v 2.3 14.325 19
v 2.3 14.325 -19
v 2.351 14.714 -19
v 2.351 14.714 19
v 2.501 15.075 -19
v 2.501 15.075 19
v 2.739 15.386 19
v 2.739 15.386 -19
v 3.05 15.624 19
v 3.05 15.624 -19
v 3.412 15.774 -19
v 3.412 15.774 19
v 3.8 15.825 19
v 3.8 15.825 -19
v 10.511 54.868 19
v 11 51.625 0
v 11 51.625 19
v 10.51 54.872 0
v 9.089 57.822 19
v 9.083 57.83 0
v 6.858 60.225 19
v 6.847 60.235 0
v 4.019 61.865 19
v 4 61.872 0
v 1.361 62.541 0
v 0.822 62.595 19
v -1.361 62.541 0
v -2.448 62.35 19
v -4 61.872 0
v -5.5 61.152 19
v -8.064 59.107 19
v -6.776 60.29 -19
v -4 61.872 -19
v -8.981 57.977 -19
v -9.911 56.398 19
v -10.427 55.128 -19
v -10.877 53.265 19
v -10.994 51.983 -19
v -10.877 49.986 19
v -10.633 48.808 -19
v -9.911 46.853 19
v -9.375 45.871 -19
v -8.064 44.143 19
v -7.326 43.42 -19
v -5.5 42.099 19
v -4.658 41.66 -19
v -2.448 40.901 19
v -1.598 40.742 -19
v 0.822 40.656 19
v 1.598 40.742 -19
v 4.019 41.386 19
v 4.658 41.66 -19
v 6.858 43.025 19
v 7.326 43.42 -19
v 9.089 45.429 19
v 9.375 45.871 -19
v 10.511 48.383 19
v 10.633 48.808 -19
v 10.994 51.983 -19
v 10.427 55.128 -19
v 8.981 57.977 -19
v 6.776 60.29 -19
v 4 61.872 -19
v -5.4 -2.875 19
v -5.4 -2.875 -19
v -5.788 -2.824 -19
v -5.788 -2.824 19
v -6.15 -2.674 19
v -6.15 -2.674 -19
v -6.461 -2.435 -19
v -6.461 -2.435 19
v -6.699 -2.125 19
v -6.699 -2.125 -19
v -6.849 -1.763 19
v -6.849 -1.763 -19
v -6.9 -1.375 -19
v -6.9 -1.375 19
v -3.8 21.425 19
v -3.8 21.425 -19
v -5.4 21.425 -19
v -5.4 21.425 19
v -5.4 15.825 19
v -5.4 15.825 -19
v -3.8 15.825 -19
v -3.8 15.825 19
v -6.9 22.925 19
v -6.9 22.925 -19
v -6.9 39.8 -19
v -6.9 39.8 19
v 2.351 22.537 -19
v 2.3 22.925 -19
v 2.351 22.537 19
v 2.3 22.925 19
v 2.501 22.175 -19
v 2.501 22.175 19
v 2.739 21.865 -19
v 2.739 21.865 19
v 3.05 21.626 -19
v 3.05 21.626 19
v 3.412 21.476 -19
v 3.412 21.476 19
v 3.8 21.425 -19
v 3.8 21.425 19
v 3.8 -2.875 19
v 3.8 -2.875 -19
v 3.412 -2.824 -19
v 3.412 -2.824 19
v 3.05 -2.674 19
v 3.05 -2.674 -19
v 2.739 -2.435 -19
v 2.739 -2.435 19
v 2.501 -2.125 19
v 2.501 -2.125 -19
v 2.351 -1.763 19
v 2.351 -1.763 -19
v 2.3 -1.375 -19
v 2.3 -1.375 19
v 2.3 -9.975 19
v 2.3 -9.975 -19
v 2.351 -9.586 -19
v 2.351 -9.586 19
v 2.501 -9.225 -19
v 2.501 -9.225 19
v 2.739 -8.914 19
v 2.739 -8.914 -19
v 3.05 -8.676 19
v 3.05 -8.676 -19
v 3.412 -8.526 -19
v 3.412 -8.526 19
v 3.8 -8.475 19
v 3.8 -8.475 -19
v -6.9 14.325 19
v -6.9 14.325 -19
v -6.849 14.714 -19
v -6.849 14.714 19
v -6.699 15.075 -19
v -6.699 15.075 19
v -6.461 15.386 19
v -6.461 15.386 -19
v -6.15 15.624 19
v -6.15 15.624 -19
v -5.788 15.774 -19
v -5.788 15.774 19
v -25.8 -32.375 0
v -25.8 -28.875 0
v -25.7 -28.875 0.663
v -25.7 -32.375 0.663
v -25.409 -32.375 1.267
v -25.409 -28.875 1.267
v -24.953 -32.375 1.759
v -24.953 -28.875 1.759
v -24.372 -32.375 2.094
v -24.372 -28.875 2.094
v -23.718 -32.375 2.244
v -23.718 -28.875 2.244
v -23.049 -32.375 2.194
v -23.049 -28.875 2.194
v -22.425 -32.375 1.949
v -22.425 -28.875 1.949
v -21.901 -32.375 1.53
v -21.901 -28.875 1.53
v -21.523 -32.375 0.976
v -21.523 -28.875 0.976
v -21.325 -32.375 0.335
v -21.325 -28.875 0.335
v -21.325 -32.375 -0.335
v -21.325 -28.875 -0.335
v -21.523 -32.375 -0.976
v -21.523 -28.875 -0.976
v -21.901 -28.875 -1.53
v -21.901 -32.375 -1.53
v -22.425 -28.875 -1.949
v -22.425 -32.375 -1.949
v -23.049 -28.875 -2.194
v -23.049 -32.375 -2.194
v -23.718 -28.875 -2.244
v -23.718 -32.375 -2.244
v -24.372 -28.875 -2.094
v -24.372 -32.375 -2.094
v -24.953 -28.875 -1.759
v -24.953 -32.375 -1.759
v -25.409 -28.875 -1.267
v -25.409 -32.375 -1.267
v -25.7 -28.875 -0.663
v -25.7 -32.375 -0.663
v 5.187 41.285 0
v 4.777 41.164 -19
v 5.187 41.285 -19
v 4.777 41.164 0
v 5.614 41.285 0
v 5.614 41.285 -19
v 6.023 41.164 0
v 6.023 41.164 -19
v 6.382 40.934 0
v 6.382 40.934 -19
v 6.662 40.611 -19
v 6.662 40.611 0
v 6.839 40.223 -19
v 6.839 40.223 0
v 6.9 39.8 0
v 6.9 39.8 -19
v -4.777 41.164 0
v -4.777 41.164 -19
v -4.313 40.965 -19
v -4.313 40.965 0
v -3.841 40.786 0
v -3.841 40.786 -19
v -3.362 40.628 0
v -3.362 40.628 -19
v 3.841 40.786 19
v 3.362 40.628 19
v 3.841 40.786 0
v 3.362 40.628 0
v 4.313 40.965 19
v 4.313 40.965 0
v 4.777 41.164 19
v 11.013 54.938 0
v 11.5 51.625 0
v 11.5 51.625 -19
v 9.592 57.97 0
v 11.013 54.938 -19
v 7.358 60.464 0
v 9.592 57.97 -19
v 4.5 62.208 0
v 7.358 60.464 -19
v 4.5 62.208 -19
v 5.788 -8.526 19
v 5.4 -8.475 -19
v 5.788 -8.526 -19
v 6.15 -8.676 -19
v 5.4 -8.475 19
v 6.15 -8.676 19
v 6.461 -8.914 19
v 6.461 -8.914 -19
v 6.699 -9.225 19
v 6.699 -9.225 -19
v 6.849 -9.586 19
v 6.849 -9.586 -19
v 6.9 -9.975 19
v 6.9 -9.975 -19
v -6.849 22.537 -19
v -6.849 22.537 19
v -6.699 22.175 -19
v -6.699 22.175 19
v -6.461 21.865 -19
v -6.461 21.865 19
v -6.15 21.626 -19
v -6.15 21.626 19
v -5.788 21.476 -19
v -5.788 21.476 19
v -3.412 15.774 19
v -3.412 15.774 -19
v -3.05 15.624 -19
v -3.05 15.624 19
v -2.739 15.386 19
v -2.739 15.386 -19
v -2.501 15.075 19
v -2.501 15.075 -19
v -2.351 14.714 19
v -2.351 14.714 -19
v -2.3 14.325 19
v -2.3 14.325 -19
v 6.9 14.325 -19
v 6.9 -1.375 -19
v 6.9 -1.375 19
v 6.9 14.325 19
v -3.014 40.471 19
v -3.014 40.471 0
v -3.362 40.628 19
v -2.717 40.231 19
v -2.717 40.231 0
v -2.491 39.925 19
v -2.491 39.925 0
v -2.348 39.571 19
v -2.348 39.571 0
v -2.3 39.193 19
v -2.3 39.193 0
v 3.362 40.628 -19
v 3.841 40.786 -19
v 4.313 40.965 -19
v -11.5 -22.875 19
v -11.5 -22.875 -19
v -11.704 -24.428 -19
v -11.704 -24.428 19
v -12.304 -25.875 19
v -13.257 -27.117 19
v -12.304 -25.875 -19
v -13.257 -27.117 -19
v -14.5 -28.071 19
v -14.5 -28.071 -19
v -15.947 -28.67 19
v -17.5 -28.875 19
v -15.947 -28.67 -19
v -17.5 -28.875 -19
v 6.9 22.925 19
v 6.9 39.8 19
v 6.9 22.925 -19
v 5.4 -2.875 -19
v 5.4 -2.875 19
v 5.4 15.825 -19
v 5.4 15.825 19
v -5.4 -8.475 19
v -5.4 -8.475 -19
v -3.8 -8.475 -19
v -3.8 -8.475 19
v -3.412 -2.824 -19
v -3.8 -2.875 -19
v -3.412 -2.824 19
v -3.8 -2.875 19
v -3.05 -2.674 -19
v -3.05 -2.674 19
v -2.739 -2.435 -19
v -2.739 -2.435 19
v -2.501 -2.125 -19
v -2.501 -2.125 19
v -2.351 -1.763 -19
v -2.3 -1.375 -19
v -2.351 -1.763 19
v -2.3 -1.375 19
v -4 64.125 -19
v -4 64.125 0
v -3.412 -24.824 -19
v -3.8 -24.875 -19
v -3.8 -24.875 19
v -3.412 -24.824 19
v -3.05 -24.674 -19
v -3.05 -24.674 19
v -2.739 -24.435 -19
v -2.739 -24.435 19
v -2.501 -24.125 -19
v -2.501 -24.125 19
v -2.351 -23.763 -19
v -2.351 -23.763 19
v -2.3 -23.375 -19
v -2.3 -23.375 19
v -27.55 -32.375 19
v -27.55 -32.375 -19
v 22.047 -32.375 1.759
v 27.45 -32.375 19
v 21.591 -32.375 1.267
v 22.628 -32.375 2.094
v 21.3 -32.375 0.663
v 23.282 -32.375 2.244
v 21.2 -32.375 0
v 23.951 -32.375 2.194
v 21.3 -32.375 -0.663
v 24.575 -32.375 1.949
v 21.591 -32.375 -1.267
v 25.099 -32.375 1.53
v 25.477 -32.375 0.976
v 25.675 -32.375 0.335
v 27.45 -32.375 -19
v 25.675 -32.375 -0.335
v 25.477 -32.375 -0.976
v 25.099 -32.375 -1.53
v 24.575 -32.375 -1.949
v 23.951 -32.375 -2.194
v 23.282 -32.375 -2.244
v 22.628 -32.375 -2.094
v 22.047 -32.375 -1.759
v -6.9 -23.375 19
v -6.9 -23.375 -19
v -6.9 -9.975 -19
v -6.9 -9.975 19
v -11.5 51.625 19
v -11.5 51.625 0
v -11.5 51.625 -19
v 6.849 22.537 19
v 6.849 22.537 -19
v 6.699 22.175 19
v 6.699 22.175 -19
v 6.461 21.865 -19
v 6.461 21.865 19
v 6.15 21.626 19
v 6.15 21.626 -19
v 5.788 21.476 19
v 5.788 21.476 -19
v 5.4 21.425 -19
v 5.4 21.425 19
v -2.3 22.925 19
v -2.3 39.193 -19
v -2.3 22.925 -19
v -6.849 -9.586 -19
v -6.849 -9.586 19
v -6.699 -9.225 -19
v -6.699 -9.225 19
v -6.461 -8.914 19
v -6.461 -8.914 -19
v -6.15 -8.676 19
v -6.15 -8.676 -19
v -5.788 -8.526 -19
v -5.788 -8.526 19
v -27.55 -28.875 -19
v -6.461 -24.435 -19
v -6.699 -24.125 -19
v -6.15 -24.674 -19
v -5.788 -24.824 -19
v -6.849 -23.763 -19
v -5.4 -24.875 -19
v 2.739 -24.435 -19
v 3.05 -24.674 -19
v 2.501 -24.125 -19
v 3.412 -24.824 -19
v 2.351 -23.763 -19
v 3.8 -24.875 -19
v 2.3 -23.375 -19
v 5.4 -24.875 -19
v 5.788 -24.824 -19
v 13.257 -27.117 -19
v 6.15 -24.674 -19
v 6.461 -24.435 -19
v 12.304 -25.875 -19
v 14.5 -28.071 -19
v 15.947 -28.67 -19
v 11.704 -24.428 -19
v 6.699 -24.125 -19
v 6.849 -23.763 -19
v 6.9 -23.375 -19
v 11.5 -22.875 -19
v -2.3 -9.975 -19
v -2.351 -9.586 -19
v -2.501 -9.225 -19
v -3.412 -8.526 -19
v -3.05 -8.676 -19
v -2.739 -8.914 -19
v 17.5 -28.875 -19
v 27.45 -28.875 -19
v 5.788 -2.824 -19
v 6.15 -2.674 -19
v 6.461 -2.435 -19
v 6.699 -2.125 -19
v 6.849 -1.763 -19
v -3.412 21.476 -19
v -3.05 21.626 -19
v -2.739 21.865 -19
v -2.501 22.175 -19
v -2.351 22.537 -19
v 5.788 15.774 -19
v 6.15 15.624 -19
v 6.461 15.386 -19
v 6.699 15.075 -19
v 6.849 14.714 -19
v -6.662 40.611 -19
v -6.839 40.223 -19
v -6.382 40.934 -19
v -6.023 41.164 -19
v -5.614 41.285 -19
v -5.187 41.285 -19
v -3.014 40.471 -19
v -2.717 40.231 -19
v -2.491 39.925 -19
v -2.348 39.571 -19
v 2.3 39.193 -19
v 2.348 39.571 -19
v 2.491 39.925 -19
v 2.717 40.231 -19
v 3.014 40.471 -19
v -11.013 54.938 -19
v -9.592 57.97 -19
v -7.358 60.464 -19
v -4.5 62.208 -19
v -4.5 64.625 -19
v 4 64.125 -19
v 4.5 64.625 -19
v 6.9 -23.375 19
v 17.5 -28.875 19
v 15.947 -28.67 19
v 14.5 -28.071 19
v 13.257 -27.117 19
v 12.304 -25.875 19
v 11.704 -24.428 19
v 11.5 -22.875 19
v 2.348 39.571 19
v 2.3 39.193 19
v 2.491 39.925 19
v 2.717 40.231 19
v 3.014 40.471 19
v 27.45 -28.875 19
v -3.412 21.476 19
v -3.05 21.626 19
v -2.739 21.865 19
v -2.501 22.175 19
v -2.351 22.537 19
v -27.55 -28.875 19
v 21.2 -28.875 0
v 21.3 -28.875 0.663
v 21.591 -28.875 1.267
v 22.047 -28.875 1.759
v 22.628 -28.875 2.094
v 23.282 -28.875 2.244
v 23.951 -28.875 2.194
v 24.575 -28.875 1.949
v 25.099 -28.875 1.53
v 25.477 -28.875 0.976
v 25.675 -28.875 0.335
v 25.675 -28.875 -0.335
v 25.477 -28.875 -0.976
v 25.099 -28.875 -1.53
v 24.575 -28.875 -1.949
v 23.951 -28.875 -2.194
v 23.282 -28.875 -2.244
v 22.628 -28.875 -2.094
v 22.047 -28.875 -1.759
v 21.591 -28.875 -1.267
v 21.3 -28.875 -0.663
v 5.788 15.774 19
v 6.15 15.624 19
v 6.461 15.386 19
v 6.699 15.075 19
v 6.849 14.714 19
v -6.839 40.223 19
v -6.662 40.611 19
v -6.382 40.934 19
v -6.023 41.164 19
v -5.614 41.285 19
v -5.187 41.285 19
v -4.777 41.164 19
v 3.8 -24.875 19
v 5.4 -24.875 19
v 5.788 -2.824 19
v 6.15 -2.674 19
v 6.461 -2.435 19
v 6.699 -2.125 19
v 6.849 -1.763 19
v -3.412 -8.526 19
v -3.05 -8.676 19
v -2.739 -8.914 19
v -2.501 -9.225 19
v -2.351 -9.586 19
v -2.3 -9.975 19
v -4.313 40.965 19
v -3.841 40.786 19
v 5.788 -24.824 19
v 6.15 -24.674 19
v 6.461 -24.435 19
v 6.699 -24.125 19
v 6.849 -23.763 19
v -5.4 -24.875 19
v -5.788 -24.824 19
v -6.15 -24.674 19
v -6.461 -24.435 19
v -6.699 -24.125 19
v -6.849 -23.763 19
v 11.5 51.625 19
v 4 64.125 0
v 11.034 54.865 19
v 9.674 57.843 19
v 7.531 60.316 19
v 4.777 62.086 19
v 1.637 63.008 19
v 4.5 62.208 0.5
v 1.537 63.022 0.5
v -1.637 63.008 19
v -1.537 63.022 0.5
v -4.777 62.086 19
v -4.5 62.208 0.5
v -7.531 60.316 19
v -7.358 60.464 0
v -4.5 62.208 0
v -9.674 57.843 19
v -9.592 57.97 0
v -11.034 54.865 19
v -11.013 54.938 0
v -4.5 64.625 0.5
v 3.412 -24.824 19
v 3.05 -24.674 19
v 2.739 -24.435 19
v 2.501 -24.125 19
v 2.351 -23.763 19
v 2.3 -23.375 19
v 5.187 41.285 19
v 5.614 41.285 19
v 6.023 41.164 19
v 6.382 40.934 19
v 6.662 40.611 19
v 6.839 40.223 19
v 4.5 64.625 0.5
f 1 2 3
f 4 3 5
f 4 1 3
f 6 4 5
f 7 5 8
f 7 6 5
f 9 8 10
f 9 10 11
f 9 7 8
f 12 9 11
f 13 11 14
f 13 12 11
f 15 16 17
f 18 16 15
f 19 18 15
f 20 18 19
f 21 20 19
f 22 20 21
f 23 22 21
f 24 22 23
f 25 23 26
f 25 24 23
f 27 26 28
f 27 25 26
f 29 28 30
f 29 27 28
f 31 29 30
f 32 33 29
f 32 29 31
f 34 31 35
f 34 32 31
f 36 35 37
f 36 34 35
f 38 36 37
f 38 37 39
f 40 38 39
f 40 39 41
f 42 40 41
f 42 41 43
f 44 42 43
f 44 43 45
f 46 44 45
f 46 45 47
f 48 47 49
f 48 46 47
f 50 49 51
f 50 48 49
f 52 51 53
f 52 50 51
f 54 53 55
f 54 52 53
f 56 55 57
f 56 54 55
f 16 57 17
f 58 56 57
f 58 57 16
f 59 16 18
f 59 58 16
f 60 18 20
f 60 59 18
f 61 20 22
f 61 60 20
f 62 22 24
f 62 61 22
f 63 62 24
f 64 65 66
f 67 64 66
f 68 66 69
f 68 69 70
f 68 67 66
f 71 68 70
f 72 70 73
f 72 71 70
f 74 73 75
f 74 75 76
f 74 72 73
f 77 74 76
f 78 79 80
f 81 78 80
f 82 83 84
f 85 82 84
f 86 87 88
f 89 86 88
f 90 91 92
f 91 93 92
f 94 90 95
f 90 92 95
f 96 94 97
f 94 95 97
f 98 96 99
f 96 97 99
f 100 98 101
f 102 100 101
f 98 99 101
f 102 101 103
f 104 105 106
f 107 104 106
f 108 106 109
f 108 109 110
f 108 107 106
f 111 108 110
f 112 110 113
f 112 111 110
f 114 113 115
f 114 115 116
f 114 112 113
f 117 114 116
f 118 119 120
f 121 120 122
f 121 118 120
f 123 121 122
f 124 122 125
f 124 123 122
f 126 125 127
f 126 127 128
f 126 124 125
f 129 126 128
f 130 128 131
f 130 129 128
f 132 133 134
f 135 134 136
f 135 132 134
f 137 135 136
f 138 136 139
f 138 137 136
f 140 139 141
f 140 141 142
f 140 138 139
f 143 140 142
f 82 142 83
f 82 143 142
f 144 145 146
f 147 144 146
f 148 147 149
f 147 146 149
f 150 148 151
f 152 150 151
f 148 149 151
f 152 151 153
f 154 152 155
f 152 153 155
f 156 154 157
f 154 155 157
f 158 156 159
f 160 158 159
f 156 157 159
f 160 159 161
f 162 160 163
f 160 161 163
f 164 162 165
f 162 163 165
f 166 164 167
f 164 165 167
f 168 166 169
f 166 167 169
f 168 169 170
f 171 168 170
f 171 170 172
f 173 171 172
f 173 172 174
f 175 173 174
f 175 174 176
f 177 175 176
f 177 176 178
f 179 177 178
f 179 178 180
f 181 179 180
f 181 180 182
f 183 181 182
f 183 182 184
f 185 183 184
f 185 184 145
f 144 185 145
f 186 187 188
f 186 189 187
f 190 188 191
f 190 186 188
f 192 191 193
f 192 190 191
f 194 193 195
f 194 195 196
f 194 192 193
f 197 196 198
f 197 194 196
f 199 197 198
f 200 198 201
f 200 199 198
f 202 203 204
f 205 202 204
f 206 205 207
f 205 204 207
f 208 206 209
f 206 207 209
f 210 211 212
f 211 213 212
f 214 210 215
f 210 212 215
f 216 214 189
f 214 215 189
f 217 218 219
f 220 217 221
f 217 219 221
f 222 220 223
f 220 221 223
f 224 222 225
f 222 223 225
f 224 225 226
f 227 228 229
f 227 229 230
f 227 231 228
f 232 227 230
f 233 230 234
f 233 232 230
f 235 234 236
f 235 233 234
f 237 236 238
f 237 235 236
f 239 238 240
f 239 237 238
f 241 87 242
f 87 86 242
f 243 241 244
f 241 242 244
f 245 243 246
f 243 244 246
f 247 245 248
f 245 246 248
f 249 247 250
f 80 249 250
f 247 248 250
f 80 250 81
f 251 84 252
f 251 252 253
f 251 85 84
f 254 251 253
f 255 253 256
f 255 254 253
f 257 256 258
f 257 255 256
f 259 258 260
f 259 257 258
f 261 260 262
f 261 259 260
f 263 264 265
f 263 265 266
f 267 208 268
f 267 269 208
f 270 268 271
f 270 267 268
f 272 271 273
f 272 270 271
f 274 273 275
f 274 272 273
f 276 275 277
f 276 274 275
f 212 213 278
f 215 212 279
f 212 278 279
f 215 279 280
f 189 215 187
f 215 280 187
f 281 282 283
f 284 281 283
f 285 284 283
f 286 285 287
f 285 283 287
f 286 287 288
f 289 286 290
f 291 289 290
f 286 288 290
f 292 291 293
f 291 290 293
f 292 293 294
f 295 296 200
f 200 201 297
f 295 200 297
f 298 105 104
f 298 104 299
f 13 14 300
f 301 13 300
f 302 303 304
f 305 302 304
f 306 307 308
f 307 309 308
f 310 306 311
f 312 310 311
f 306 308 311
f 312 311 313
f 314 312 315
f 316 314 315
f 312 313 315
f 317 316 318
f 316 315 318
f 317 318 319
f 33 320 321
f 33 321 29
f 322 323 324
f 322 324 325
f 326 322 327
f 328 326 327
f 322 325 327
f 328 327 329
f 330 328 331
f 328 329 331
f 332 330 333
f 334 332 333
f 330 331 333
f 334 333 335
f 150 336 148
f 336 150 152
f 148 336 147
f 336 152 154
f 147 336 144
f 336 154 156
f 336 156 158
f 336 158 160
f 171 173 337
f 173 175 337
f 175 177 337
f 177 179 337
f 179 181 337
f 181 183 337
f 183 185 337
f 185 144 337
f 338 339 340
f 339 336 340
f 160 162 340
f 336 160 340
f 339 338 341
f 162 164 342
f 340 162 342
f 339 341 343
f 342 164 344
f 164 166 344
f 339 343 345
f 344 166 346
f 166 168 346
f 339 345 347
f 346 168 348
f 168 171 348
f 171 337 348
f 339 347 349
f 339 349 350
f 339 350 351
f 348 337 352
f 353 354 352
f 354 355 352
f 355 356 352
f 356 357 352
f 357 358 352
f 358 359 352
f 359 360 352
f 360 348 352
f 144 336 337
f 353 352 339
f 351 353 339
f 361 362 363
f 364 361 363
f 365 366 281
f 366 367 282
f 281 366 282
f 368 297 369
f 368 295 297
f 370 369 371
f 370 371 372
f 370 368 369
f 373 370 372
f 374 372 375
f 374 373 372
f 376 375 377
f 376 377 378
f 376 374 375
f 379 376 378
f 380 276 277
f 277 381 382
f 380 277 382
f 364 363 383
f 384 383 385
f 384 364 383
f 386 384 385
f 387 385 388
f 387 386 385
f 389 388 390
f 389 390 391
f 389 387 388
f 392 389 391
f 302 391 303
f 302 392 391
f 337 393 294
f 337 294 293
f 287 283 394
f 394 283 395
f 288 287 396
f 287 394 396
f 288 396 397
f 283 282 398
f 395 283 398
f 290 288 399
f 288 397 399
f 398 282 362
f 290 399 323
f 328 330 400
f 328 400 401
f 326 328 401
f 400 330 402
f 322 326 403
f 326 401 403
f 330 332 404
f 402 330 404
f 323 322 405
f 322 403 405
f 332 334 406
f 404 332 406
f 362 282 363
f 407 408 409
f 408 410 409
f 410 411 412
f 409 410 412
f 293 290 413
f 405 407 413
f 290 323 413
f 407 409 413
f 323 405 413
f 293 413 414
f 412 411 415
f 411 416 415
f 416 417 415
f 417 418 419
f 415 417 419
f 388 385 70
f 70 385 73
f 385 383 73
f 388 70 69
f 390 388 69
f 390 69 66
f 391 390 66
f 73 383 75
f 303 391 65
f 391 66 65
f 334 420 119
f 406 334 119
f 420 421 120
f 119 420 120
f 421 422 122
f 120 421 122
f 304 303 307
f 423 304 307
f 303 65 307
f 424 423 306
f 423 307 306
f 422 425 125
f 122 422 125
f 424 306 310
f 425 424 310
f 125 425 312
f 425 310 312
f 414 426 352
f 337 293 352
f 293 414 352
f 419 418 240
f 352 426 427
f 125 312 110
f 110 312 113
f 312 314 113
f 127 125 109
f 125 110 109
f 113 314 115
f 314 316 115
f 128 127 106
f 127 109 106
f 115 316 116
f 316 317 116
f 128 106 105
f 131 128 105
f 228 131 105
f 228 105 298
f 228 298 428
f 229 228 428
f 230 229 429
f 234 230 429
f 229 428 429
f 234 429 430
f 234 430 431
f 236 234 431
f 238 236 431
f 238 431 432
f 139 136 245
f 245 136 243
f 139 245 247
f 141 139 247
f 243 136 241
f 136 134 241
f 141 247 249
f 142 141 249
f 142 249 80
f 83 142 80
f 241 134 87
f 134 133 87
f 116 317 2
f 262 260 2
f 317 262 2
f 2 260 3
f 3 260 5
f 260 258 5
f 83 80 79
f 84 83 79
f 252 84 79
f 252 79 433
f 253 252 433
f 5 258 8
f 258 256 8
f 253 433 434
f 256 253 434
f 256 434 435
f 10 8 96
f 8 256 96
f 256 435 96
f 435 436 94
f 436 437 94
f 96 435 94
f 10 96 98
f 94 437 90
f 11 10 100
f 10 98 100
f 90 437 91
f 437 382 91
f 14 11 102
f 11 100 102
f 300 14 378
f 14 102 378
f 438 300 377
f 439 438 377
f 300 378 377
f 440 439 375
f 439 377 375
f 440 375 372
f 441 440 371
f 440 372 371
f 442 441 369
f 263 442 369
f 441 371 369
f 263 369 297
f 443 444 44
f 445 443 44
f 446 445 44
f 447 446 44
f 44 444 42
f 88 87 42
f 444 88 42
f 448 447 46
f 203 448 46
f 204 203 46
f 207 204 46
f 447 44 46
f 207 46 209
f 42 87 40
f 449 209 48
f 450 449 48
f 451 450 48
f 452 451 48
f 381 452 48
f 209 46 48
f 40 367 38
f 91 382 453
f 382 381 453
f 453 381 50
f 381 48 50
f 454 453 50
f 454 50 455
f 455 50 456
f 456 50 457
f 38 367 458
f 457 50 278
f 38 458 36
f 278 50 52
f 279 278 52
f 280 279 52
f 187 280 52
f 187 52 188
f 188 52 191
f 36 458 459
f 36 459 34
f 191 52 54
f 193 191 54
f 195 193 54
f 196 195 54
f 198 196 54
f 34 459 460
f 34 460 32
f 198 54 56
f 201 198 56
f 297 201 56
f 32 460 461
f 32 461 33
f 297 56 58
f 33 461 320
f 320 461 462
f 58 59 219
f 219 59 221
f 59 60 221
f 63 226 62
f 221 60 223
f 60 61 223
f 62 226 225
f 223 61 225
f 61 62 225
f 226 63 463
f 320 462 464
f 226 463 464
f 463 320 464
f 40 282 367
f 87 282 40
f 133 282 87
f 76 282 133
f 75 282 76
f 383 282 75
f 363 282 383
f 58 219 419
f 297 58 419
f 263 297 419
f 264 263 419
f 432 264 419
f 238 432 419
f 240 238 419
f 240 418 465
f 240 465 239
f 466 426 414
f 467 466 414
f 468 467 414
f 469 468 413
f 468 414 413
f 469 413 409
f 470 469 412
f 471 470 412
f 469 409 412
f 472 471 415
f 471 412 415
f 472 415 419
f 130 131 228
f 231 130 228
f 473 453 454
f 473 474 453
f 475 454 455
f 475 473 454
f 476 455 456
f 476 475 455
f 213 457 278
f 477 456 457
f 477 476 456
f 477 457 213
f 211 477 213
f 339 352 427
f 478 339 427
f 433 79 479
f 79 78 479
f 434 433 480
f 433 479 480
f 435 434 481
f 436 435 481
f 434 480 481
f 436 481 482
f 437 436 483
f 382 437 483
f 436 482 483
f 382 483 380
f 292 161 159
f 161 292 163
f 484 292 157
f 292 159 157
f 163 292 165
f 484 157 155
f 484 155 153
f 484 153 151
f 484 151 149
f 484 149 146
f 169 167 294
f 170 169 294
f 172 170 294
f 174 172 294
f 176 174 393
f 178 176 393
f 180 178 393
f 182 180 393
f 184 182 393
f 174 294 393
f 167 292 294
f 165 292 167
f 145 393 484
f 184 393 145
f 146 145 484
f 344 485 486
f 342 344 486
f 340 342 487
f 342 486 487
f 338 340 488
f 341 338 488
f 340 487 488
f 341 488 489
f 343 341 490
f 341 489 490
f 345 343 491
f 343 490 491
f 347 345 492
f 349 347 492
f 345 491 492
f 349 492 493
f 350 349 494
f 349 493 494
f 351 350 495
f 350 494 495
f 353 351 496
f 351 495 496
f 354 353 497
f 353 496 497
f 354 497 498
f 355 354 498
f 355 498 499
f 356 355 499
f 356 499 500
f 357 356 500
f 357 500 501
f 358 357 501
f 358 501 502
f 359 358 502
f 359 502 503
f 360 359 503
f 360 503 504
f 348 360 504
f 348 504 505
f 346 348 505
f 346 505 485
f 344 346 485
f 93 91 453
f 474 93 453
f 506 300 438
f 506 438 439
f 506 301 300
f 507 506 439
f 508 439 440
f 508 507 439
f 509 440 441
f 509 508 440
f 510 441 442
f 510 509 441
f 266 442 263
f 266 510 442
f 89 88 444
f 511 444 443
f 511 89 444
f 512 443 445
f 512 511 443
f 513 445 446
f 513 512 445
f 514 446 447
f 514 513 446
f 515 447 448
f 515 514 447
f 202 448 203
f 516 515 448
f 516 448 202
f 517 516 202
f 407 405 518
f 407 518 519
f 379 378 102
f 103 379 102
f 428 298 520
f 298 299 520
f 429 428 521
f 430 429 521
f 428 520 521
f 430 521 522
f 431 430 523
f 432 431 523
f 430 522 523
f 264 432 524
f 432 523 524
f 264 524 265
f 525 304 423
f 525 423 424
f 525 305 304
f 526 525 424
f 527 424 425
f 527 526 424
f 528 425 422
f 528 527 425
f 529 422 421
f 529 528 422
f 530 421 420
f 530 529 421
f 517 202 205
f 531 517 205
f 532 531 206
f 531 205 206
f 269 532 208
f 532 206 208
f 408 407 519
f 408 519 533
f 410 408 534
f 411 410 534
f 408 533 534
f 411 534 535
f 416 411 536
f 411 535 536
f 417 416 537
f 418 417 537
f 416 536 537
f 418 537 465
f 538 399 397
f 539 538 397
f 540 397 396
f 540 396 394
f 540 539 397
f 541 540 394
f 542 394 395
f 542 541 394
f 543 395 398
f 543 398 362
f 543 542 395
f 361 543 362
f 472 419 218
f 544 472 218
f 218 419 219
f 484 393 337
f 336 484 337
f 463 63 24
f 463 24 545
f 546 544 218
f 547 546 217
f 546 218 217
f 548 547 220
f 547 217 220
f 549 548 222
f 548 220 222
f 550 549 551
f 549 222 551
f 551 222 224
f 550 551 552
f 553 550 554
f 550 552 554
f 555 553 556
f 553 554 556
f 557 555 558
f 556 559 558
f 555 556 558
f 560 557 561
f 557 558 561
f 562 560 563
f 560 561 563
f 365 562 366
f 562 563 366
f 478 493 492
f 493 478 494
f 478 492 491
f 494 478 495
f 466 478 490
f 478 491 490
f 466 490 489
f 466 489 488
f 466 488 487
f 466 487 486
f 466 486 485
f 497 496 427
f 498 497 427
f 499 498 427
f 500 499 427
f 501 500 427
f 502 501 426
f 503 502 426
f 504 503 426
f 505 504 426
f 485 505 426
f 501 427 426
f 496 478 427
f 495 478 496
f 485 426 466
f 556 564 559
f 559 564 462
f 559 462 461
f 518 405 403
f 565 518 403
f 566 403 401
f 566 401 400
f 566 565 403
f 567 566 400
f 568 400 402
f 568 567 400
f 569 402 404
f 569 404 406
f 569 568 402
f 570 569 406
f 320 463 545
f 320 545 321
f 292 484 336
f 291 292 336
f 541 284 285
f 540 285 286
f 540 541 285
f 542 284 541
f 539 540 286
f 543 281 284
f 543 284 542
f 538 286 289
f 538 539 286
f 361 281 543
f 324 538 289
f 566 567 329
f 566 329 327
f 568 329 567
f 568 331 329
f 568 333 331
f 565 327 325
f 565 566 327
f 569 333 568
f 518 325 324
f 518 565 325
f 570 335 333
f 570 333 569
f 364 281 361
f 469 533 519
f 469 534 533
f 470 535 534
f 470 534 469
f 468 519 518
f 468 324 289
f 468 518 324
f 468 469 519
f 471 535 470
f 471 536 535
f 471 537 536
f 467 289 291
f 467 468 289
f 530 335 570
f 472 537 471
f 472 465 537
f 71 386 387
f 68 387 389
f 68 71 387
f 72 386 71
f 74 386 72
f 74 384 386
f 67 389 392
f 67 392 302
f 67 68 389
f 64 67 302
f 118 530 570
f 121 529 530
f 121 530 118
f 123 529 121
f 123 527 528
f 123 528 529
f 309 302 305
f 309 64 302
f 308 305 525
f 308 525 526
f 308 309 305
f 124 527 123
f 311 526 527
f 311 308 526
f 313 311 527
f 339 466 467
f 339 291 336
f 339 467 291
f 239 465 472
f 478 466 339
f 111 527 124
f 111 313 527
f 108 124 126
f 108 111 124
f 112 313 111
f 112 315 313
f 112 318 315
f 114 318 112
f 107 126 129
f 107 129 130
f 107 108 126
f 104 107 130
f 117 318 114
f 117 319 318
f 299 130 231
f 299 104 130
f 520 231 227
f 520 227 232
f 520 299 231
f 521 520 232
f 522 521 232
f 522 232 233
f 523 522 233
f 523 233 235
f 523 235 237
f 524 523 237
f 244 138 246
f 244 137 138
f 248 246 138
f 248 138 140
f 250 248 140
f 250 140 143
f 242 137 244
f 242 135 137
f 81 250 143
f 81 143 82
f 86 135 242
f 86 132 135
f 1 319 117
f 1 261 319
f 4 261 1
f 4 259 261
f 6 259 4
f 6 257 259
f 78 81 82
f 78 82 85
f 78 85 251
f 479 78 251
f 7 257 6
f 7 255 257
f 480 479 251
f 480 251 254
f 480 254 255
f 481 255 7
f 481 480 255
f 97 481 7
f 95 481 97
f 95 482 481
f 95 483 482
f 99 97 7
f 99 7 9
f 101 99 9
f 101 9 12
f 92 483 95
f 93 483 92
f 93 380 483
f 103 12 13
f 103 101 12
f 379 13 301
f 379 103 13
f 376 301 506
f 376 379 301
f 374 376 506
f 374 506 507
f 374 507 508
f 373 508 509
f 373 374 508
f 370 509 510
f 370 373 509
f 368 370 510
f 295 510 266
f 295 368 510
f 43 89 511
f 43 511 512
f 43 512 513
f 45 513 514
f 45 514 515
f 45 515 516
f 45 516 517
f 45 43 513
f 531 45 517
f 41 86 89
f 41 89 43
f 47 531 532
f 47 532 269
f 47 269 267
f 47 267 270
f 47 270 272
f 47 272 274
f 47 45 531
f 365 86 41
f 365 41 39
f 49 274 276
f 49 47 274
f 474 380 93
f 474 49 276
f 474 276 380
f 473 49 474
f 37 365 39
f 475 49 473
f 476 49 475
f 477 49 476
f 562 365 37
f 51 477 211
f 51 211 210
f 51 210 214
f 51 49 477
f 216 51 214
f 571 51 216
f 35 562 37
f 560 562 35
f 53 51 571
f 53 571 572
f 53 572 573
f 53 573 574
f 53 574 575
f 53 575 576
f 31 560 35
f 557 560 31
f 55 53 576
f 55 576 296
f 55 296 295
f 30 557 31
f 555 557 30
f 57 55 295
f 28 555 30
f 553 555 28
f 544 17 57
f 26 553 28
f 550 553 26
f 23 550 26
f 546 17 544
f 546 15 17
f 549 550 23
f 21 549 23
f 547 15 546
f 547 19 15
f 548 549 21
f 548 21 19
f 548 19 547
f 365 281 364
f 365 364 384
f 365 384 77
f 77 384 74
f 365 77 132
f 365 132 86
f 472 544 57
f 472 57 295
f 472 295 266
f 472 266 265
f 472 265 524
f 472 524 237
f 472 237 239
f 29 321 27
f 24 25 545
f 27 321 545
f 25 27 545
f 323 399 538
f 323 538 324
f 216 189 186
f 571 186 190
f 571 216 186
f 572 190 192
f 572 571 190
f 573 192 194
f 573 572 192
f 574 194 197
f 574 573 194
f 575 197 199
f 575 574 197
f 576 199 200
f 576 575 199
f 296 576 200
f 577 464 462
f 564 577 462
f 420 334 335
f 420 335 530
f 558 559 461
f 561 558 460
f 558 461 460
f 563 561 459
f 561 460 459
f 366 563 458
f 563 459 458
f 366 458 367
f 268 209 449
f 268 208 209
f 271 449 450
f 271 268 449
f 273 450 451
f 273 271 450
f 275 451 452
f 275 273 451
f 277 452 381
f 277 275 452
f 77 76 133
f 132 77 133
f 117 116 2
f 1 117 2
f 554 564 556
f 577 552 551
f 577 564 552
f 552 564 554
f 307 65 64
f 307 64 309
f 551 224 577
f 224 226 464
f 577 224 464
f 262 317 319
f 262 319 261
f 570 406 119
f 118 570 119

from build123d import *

# Parameters (mm, degrees)
CROQUIS1_R              = 11.5
CROQUIS1_R_2            = 11
SALIENTE_EXTRUIR1_DEPTH = 19
SALIENTE_EXTRUIR2_DEPTH = 0.5
SALIENTE_EXTRUIR3_START = 19
SALIENTE_EXTRUIR3_DEPTH = 19
SALIENTE_EXTRUIR4_START = -38
CROQUIS4_W              = 4.6
CROQUIS4_H              = 16.4
CROQUIS4_H_2            = 18.7
SALIENTE_EXTRUIR4_DEPTH = 38
CROQUIS5_R              = 2.25
CORTAR_EXTRUIR1_DEPTH   = 38
REDONDEO1_R             = 1.5


with BuildPart() as part:
    # Croquis1 → Saliente-Extruir1 (new body)
    with BuildSketch(Plane.XY):
        with Locations((0, 51.625329815)):
            Circle(CROQUIS1_R)
        with Locations((0, 51.625329815)):
            Circle(CROQUIS1_R_2, mode=Mode.SUBTRACT)
    extrude(amount=SALIENTE_EXTRUIR1_DEPTH)

    # Croquis3 → Saliente-Extruir2 (add)
    with BuildSketch(Plane(origin=(0, 0, 0), x_dir=(-1, 0, 0), z_dir=(0, 0, -1))):
        with BuildLine():
            Line((-4.5, 64.625329815), (4.5, 64.625329815))
            Line((4.5, 64.625329815), (4.5, 62.20833506))
            ThreePointArc((4.5, 62.20833506), (0, 63.125329815), (-4.5, 62.20833506))
            Line((-4.5, 62.20833506), (-4.5, 64.625329815))
        make_face()
    extrude(amount=-SALIENTE_EXTRUIR2_DEPTH)

    # Croquis2 → Saliente-Extruir3 (add)
    with BuildSketch(Plane(origin=(0, 0, 0), x_dir=(-1, 0, 0), z_dir=(0, 0, -1)).offset(SALIENTE_EXTRUIR3_START)):
        with BuildLine():
            Line((-4.5, 64.625329815), (4.5, 64.625329815))
            Line((4.5, 64.625329815), (4.5, 62.20833506))
            ThreePointArc((4.5, 62.20833506), (0, 40.125329815), (-4.5, 62.20833506))
            Line((-4.5, 62.20833506), (-4.5, 64.625329815))
        make_face()
        with BuildLine():
            Line((-4, 64.125329815), (4, 64.125329815))
            Line((4, 64.125329815), (4, 61.872280581))
            ThreePointArc((4, 61.872280581), (0, 40.625329815), (-4, 61.872280581))
            Line((-4, 61.872280581), (-4, 64.125329815))
        make_face(mode=Mode.SUBTRACT)
    extrude(amount=-SALIENTE_EXTRUIR3_DEPTH)

    # Croquis4 → Saliente-Extruir4 (add)
    with BuildSketch(Plane.XY.offset(19).offset(SALIENTE_EXTRUIR4_START)):
        with BuildLine():
            ThreePointArc((-6.9, 42.425329815), (-10.285912696, 46.482373467), (-11.5, 51.625329815))
            Line((-11.5, 51.625329815), (-11.5, -22.874670185))
            ThreePointArc((-11.5, -22.874670185), (-13.257359313, -27.117310872), (-17.5, -28.874670185))
            Line((-17.5, -28.874670185), (-27.55, -28.874670185))
            Line((-27.55, -28.874670185), (-27.55, -32.374670185))
            Line((-27.55, -32.374670185), (-11.55, -32.374670185))
            Line((-11.55, -32.374670185), (11.45, -32.374670185))
            Line((11.45, -32.374670185), (27.45, -32.374670185))
            Line((27.45, -32.374670185), (27.45, -28.874670185))
            Line((27.45, -28.874670185), (17.5, -28.874670185))
            ThreePointArc((17.5, -28.874670185), (13.257359313, -27.117310872), (11.5, -22.874670185))
            Line((11.5, -22.874670185), (11.5, 51.625329815))
            ThreePointArc((11.5, 51.625329815), (10.285912696, 46.482373467), (6.9, 42.425329815))
            Line((6.9, 42.425329815), (6.9, 21.425329815))
            Line((6.9, 21.425329815), (2.3, 21.425329815))
            Line((2.3, 21.425329815), (2.3, 40.357676999))
            ThreePointArc((2.3, 40.357676999), (0, 40.125329815), (-2.3, 40.357676999))
            Line((-2.3, 40.357676999), (-2.3, 21.425329815))
            Line((-2.3, 21.425329815), (-6.9, 21.425329815))
            Line((-6.9, 21.425329815), (-6.9, 42.425329815))
        make_face()
        with Locations((-4.6, -16.674670185)):
            Rectangle(CROQUIS4_W, CROQUIS4_H, mode=Mode.SUBTRACT)
        with Locations((-4.6, 6.475329815)):
            Rectangle(CROQUIS4_W, CROQUIS4_H_2, mode=Mode.SUBTRACT)
        with Locations((4.6, -16.674670185)):
            Rectangle(CROQUIS4_W, CROQUIS4_H, mode=Mode.SUBTRACT)
        with Locations((4.6, 6.475329815)):
            Rectangle(CROQUIS4_W, CROQUIS4_H_2, mode=Mode.SUBTRACT)
    extrude(amount=SALIENTE_EXTRUIR4_DEPTH)

    # Croquis5 → Cortar-Extruir1 (cut)
    with BuildSketch(Plane(origin=(0, -28.874670185, 0), x_dir=(1, 0, 0), z_dir=(0, 1, 0))):
        with Locations(Location((-23.55, 0, 0), (0, 0, 180))):
            Circle(CROQUIS5_R)
        with Locations(Location((23.45, 0, 0), (0, 0, 180))):
            Circle(CROQUIS5_R)
    extrude(amount=-CORTAR_EXTRUIR1_DEPTH, mode=Mode.SUBTRACT)

    # Redondeo1
    redondeo1_edges = [part.edges().sort_by_distance(p)[0] for p in [
        (2.3, -8.474670185, 0),
        (2.3, -24.874670185, 0),
        (6.9, -24.874670185, 0),
        (-6.9, -8.474670185, 0),
        (-6.9, -24.874670185, 0),
        (-2.3, -24.874670185, 0),
        (-2.3, -2.874670185, 0),
        (-2.3, 15.825329815, 0),
        (-6.9, 15.825329815, 0),
        (6.9, -2.874670185, 0),
        (6.9, 15.825329815, 0),
        (2.3, 15.825329815, 0),
        (-6.9, 42.425329815, 0),
        (-6.9, 21.425329815, 0),
        (-2.3, 21.425329815, 0),
        (-2.3, 40.357676999, 0),
        (2.3, 40.357676999, 0),
        (2.3, 21.425329815, 0),
        (6.9, 21.425329815, 0),
        (6.9, 42.425329815, 0),
        (-2.3, -8.474670185, 0),
        (-6.9, -2.874670185, 0),
        (2.3, -2.874670185, 0),
        (6.9, -8.474670185, 0),
    ]]
    fillet(redondeo1_edges, radius=REDONDEO1_R)


solid = part.part
